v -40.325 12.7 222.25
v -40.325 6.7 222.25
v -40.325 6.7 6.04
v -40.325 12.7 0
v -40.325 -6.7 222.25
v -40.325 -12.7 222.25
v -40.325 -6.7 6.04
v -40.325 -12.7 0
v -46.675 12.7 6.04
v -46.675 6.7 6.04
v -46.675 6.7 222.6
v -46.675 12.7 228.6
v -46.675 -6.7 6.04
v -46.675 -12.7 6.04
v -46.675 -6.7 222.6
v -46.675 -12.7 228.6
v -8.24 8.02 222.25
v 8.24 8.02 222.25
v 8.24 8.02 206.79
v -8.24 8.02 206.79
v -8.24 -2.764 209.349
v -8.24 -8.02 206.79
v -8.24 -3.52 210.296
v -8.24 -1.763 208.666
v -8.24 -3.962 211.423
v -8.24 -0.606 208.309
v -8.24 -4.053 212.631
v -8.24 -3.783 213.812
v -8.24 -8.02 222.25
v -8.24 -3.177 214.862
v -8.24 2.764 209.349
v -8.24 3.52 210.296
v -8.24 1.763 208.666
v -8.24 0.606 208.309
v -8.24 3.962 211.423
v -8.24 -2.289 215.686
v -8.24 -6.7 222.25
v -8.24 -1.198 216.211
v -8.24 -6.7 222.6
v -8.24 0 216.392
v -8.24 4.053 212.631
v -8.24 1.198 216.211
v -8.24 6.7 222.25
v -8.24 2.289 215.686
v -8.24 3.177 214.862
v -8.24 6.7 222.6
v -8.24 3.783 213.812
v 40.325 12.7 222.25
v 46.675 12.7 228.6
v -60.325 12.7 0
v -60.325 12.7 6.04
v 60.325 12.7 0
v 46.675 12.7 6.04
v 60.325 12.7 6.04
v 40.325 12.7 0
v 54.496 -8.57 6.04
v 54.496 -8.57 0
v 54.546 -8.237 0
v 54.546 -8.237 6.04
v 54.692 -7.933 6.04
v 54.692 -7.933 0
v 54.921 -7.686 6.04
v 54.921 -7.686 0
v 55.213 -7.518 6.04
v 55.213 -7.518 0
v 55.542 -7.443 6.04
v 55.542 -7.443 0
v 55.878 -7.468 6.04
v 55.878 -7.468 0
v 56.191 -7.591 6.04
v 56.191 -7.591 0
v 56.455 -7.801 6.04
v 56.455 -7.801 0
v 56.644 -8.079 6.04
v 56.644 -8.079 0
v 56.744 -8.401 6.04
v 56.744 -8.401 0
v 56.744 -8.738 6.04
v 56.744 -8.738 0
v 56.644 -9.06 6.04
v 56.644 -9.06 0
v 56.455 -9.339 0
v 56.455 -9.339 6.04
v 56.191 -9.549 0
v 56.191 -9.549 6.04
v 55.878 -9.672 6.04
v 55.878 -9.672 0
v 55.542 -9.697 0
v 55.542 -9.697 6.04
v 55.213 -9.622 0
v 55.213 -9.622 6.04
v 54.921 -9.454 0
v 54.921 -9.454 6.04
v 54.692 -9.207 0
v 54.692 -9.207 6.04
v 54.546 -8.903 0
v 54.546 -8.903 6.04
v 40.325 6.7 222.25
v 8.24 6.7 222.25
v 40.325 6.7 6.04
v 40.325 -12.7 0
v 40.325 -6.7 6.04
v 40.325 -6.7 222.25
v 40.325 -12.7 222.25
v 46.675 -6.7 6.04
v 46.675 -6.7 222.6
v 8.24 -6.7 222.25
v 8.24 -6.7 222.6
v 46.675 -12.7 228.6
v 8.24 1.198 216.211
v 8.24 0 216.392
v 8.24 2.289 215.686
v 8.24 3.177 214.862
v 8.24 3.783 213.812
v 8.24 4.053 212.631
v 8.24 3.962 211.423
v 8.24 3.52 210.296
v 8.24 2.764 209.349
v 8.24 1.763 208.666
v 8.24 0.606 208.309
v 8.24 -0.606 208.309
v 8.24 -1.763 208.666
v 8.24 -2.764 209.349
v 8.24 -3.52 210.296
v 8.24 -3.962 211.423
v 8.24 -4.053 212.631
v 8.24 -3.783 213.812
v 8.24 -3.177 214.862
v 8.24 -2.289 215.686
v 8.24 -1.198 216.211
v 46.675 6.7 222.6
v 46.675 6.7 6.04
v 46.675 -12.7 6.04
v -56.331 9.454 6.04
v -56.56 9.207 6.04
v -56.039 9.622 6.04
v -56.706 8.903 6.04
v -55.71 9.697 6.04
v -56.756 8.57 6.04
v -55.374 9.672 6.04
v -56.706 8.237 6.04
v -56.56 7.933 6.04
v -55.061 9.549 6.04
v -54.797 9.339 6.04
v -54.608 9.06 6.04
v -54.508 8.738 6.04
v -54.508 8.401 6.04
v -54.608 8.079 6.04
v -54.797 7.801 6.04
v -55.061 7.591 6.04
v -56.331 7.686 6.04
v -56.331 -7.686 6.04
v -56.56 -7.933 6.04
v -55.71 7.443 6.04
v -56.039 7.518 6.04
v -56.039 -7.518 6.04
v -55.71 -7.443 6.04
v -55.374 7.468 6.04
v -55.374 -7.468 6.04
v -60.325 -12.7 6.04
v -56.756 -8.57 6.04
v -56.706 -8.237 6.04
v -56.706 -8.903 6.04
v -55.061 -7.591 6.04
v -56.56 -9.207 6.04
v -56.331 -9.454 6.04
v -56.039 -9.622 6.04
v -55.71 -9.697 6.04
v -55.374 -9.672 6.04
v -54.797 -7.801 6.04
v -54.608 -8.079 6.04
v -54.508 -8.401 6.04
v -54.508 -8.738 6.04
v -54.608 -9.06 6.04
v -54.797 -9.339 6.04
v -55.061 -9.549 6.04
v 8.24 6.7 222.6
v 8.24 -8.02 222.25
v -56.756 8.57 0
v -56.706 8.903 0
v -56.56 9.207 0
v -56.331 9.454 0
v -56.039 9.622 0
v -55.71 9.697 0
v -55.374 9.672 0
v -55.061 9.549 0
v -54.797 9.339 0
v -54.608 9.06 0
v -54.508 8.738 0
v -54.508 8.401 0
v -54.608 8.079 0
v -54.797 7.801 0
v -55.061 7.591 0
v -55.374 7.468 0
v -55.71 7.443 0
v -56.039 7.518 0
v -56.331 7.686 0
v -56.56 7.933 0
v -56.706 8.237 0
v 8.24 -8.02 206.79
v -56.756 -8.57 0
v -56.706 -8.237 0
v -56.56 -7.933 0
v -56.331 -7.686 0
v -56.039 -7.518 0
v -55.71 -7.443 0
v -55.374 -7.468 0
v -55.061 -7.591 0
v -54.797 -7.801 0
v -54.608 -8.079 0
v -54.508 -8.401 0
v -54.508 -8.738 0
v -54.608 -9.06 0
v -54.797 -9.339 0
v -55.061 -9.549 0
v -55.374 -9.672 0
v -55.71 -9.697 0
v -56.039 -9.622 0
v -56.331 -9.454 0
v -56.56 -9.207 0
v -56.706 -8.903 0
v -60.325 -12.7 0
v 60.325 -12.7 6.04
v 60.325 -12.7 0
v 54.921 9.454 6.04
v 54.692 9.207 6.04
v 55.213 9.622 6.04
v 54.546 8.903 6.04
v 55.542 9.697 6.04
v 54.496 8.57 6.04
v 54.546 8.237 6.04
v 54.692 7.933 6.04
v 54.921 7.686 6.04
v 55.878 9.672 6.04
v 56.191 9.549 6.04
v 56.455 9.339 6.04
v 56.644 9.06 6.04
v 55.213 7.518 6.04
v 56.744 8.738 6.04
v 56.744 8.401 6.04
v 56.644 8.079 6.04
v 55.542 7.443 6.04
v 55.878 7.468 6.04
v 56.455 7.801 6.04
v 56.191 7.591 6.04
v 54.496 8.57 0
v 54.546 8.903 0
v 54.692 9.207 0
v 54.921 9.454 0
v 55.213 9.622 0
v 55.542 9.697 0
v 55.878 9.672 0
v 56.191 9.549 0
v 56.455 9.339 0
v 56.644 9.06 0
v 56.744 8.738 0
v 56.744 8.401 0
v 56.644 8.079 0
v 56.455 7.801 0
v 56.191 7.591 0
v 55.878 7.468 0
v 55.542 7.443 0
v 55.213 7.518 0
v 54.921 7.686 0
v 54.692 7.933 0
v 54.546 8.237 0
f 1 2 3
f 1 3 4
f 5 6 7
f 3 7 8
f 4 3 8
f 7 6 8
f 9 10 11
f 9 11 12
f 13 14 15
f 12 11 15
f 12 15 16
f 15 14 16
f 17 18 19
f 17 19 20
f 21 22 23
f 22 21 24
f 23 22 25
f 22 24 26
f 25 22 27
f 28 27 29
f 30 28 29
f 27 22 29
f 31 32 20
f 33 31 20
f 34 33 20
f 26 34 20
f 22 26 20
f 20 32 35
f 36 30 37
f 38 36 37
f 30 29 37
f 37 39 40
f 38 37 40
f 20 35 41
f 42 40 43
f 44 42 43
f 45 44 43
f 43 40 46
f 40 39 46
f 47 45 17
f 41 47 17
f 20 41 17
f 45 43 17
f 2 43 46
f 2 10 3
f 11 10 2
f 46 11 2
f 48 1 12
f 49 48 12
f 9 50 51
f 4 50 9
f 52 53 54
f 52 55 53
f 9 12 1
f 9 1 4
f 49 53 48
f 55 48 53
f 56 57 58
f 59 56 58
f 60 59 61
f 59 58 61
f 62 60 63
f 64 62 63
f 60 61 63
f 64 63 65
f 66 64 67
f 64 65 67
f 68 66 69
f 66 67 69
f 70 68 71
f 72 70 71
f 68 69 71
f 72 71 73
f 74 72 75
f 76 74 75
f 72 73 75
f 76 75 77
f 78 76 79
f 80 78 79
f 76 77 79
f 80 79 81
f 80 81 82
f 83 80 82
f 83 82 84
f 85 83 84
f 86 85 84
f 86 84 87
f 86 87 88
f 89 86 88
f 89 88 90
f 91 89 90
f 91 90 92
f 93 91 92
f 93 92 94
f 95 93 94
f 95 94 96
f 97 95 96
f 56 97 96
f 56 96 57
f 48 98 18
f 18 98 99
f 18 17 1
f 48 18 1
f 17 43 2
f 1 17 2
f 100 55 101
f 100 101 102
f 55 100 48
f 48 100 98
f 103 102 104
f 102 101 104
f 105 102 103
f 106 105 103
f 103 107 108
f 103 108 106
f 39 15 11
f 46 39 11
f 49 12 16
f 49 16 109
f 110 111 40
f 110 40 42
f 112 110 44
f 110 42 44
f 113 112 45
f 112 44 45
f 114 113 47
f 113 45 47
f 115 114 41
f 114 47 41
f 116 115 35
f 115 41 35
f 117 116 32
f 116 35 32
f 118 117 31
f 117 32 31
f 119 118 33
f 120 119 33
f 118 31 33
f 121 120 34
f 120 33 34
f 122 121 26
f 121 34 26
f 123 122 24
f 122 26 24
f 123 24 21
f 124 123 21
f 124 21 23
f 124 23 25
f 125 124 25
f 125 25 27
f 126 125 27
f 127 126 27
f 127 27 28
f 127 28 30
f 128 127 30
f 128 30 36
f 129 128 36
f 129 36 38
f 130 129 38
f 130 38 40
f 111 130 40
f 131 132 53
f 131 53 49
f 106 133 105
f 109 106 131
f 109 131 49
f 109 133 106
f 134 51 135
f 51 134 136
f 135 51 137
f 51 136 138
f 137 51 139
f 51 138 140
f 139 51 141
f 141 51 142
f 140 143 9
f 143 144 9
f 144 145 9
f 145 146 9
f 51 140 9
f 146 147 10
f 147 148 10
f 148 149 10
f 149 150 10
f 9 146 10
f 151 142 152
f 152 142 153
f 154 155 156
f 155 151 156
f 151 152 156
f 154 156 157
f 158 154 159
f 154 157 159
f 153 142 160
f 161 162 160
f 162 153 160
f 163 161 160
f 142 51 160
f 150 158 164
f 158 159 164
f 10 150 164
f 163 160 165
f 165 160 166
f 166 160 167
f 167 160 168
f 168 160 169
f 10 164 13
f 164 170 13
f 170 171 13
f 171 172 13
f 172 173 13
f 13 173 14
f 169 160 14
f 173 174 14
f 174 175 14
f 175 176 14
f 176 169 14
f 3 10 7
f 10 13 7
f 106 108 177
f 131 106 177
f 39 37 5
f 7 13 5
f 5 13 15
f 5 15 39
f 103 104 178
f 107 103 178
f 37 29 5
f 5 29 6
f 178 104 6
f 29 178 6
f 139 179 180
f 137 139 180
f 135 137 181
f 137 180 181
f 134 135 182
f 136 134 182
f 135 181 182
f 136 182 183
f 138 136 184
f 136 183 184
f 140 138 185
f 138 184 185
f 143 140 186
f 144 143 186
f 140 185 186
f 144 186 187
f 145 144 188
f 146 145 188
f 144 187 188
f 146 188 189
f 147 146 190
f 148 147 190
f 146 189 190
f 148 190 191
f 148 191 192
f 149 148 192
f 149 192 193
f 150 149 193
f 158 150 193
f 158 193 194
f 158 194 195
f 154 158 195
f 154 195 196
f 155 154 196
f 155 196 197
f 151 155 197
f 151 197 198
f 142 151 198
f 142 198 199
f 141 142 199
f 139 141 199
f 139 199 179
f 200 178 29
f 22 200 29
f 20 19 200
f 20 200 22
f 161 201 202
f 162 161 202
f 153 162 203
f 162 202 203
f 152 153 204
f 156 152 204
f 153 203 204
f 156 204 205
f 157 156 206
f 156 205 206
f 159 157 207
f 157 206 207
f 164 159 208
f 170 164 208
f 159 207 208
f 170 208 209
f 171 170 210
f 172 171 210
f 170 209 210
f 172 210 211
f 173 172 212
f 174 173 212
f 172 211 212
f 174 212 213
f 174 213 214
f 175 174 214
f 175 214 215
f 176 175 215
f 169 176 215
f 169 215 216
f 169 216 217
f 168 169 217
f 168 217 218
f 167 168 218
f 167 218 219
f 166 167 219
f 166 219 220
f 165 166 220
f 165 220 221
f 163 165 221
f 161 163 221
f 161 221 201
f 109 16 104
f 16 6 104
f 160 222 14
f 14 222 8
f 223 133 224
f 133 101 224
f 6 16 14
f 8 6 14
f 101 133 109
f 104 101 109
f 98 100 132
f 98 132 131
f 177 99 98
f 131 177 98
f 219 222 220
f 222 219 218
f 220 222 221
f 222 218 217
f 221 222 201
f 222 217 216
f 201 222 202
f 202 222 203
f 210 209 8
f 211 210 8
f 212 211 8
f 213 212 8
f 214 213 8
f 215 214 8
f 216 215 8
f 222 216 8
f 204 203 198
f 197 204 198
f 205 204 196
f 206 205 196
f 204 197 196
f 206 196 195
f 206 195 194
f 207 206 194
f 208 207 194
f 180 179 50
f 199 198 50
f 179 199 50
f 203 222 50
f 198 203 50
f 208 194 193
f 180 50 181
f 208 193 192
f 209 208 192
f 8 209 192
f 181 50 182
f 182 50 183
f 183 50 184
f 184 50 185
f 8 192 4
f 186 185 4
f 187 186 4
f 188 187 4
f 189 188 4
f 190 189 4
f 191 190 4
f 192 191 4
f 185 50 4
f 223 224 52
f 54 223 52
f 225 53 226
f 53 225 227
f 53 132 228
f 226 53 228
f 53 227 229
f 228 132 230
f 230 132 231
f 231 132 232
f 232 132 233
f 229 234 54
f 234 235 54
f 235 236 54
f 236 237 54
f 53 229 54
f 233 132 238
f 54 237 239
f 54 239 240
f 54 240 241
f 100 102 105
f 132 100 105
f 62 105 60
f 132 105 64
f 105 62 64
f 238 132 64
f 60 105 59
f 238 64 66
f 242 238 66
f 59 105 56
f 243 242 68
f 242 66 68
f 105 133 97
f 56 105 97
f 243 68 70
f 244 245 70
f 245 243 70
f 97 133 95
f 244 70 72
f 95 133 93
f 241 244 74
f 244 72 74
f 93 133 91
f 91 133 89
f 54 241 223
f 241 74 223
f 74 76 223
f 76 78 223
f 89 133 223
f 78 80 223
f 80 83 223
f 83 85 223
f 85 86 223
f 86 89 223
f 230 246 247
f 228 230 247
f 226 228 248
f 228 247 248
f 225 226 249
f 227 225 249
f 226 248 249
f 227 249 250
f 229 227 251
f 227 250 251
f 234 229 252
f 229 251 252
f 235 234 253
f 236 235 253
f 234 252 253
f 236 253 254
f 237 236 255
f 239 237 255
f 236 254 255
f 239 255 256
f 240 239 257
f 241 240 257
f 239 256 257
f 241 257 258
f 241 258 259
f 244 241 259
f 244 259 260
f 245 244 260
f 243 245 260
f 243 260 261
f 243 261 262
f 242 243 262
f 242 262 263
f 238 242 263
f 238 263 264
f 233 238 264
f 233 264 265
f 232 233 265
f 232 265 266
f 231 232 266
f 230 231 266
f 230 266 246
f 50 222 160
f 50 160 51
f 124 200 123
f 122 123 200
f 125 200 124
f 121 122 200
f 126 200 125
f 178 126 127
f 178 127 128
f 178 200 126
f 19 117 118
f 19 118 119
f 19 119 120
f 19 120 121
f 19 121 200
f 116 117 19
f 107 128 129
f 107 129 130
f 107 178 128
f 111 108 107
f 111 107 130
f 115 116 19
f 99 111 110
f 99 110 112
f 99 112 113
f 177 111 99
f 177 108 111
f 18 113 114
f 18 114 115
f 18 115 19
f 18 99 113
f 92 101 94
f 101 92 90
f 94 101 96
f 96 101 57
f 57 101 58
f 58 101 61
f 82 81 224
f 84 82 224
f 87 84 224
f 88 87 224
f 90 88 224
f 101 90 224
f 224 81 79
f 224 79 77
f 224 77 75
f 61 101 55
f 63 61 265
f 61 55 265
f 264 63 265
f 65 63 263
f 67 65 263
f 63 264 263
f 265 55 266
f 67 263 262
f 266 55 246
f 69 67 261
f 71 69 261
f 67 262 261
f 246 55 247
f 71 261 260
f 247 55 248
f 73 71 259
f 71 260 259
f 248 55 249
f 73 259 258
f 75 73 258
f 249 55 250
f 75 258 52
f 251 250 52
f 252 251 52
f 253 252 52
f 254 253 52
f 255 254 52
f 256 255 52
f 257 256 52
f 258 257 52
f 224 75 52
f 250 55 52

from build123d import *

# Parameters (mm, degrees)
SKETCH2_W             = 120.65
SKETCH2_H             = 25.4
BOSS_EXTRUDE2_DEPTH   = 228.6
F_4_40_TAPPED_HOLE2_D = 2.2606
SKETCH3_W             = 13.65
SKETCH3_H             = 222.560167774
CUT_EXTRUDE2_DEPTH    = 228.6
SKETCH9_W             = 216.560167774
SKETCH9_H             = 13.4
CUT_EXTRUDE3_DEPTH    = 228.6
SKETCH12_W            = 16.47911479
SKETCH12_H            = 16.039471942
BOSS_EXTRUDE4_DEPTH   = 15.81
SKETCH13_R            = 4.064
CUT_EXTRUDE4_DEPTH    = 21.81


with BuildPart() as part:
    # Sketch2 → Boss-Extrude2 (new body)
    with BuildSketch(Plane.XY):
        Rectangle(SKETCH2_W, SKETCH2_H)
    extrude(amount=BOSS_EXTRUDE2_DEPTH)

    # #4-40 Tapped Hole2 (through all)
    with Locations(Plane.XY.offset(228.6)):
        with Locations((-55.626, 8.5698965), (-55.626, -8.5698965), (55.626, 8.5698965), (55.626, -8.5698965)):
            Hole(F_4_40_TAPPED_HOLE2_D / 2)

    # Sketch3 → Cut-Extrude2 (cut)
    with BuildSketch(Plane.XZ.offset(12.7)):
        Polygon((-40.325, 6.039832226), (-40.325, 0), (40.325, 0), (40.325, 6.039832226), (40.325, 222.25), (-40.325, 222.25), align=None)
        with Locations((-53.5, 117.319916113)):
            Rectangle(SKETCH3_W, SKETCH3_H)
        with Locations((53.5, 117.319916113)):
            Rectangle(SKETCH3_W, SKETCH3_H)
    extrude(amount=-CUT_EXTRUDE2_DEPTH, mode=Mode.SUBTRACT)

    # Sketch9 → Cut-Extrude3 (cut)
    with BuildSketch(Plane.ZY.offset(46.675)):
        with Locations((114.319916113, 0)):
            Rectangle(SKETCH9_W, SKETCH9_H)
    extrude(amount=-CUT_EXTRUDE3_DEPTH, mode=Mode.SUBTRACT)

    # Sketch12 → Boss-Extrude4 (add)
    with BuildSketch(Plane(origin=(0, 0, 222.6), x_dir=(-1, 0, 0), z_dir=(0, 0, -1))):
        Rectangle(SKETCH12_W, SKETCH12_H)
    extrude(amount=BOSS_EXTRUDE4_DEPTH)

    # Sketch13 → Cut-Extrude4 (cut)
    with BuildSketch(Plane.ZY.offset(8.239557395)):
        with Locations((212.3276832, 0)):
            Circle(SKETCH13_R)
    extrude(amount=-CUT_EXTRUDE4_DEPTH, mode=Mode.SUBTRACT)


solid = part.part
